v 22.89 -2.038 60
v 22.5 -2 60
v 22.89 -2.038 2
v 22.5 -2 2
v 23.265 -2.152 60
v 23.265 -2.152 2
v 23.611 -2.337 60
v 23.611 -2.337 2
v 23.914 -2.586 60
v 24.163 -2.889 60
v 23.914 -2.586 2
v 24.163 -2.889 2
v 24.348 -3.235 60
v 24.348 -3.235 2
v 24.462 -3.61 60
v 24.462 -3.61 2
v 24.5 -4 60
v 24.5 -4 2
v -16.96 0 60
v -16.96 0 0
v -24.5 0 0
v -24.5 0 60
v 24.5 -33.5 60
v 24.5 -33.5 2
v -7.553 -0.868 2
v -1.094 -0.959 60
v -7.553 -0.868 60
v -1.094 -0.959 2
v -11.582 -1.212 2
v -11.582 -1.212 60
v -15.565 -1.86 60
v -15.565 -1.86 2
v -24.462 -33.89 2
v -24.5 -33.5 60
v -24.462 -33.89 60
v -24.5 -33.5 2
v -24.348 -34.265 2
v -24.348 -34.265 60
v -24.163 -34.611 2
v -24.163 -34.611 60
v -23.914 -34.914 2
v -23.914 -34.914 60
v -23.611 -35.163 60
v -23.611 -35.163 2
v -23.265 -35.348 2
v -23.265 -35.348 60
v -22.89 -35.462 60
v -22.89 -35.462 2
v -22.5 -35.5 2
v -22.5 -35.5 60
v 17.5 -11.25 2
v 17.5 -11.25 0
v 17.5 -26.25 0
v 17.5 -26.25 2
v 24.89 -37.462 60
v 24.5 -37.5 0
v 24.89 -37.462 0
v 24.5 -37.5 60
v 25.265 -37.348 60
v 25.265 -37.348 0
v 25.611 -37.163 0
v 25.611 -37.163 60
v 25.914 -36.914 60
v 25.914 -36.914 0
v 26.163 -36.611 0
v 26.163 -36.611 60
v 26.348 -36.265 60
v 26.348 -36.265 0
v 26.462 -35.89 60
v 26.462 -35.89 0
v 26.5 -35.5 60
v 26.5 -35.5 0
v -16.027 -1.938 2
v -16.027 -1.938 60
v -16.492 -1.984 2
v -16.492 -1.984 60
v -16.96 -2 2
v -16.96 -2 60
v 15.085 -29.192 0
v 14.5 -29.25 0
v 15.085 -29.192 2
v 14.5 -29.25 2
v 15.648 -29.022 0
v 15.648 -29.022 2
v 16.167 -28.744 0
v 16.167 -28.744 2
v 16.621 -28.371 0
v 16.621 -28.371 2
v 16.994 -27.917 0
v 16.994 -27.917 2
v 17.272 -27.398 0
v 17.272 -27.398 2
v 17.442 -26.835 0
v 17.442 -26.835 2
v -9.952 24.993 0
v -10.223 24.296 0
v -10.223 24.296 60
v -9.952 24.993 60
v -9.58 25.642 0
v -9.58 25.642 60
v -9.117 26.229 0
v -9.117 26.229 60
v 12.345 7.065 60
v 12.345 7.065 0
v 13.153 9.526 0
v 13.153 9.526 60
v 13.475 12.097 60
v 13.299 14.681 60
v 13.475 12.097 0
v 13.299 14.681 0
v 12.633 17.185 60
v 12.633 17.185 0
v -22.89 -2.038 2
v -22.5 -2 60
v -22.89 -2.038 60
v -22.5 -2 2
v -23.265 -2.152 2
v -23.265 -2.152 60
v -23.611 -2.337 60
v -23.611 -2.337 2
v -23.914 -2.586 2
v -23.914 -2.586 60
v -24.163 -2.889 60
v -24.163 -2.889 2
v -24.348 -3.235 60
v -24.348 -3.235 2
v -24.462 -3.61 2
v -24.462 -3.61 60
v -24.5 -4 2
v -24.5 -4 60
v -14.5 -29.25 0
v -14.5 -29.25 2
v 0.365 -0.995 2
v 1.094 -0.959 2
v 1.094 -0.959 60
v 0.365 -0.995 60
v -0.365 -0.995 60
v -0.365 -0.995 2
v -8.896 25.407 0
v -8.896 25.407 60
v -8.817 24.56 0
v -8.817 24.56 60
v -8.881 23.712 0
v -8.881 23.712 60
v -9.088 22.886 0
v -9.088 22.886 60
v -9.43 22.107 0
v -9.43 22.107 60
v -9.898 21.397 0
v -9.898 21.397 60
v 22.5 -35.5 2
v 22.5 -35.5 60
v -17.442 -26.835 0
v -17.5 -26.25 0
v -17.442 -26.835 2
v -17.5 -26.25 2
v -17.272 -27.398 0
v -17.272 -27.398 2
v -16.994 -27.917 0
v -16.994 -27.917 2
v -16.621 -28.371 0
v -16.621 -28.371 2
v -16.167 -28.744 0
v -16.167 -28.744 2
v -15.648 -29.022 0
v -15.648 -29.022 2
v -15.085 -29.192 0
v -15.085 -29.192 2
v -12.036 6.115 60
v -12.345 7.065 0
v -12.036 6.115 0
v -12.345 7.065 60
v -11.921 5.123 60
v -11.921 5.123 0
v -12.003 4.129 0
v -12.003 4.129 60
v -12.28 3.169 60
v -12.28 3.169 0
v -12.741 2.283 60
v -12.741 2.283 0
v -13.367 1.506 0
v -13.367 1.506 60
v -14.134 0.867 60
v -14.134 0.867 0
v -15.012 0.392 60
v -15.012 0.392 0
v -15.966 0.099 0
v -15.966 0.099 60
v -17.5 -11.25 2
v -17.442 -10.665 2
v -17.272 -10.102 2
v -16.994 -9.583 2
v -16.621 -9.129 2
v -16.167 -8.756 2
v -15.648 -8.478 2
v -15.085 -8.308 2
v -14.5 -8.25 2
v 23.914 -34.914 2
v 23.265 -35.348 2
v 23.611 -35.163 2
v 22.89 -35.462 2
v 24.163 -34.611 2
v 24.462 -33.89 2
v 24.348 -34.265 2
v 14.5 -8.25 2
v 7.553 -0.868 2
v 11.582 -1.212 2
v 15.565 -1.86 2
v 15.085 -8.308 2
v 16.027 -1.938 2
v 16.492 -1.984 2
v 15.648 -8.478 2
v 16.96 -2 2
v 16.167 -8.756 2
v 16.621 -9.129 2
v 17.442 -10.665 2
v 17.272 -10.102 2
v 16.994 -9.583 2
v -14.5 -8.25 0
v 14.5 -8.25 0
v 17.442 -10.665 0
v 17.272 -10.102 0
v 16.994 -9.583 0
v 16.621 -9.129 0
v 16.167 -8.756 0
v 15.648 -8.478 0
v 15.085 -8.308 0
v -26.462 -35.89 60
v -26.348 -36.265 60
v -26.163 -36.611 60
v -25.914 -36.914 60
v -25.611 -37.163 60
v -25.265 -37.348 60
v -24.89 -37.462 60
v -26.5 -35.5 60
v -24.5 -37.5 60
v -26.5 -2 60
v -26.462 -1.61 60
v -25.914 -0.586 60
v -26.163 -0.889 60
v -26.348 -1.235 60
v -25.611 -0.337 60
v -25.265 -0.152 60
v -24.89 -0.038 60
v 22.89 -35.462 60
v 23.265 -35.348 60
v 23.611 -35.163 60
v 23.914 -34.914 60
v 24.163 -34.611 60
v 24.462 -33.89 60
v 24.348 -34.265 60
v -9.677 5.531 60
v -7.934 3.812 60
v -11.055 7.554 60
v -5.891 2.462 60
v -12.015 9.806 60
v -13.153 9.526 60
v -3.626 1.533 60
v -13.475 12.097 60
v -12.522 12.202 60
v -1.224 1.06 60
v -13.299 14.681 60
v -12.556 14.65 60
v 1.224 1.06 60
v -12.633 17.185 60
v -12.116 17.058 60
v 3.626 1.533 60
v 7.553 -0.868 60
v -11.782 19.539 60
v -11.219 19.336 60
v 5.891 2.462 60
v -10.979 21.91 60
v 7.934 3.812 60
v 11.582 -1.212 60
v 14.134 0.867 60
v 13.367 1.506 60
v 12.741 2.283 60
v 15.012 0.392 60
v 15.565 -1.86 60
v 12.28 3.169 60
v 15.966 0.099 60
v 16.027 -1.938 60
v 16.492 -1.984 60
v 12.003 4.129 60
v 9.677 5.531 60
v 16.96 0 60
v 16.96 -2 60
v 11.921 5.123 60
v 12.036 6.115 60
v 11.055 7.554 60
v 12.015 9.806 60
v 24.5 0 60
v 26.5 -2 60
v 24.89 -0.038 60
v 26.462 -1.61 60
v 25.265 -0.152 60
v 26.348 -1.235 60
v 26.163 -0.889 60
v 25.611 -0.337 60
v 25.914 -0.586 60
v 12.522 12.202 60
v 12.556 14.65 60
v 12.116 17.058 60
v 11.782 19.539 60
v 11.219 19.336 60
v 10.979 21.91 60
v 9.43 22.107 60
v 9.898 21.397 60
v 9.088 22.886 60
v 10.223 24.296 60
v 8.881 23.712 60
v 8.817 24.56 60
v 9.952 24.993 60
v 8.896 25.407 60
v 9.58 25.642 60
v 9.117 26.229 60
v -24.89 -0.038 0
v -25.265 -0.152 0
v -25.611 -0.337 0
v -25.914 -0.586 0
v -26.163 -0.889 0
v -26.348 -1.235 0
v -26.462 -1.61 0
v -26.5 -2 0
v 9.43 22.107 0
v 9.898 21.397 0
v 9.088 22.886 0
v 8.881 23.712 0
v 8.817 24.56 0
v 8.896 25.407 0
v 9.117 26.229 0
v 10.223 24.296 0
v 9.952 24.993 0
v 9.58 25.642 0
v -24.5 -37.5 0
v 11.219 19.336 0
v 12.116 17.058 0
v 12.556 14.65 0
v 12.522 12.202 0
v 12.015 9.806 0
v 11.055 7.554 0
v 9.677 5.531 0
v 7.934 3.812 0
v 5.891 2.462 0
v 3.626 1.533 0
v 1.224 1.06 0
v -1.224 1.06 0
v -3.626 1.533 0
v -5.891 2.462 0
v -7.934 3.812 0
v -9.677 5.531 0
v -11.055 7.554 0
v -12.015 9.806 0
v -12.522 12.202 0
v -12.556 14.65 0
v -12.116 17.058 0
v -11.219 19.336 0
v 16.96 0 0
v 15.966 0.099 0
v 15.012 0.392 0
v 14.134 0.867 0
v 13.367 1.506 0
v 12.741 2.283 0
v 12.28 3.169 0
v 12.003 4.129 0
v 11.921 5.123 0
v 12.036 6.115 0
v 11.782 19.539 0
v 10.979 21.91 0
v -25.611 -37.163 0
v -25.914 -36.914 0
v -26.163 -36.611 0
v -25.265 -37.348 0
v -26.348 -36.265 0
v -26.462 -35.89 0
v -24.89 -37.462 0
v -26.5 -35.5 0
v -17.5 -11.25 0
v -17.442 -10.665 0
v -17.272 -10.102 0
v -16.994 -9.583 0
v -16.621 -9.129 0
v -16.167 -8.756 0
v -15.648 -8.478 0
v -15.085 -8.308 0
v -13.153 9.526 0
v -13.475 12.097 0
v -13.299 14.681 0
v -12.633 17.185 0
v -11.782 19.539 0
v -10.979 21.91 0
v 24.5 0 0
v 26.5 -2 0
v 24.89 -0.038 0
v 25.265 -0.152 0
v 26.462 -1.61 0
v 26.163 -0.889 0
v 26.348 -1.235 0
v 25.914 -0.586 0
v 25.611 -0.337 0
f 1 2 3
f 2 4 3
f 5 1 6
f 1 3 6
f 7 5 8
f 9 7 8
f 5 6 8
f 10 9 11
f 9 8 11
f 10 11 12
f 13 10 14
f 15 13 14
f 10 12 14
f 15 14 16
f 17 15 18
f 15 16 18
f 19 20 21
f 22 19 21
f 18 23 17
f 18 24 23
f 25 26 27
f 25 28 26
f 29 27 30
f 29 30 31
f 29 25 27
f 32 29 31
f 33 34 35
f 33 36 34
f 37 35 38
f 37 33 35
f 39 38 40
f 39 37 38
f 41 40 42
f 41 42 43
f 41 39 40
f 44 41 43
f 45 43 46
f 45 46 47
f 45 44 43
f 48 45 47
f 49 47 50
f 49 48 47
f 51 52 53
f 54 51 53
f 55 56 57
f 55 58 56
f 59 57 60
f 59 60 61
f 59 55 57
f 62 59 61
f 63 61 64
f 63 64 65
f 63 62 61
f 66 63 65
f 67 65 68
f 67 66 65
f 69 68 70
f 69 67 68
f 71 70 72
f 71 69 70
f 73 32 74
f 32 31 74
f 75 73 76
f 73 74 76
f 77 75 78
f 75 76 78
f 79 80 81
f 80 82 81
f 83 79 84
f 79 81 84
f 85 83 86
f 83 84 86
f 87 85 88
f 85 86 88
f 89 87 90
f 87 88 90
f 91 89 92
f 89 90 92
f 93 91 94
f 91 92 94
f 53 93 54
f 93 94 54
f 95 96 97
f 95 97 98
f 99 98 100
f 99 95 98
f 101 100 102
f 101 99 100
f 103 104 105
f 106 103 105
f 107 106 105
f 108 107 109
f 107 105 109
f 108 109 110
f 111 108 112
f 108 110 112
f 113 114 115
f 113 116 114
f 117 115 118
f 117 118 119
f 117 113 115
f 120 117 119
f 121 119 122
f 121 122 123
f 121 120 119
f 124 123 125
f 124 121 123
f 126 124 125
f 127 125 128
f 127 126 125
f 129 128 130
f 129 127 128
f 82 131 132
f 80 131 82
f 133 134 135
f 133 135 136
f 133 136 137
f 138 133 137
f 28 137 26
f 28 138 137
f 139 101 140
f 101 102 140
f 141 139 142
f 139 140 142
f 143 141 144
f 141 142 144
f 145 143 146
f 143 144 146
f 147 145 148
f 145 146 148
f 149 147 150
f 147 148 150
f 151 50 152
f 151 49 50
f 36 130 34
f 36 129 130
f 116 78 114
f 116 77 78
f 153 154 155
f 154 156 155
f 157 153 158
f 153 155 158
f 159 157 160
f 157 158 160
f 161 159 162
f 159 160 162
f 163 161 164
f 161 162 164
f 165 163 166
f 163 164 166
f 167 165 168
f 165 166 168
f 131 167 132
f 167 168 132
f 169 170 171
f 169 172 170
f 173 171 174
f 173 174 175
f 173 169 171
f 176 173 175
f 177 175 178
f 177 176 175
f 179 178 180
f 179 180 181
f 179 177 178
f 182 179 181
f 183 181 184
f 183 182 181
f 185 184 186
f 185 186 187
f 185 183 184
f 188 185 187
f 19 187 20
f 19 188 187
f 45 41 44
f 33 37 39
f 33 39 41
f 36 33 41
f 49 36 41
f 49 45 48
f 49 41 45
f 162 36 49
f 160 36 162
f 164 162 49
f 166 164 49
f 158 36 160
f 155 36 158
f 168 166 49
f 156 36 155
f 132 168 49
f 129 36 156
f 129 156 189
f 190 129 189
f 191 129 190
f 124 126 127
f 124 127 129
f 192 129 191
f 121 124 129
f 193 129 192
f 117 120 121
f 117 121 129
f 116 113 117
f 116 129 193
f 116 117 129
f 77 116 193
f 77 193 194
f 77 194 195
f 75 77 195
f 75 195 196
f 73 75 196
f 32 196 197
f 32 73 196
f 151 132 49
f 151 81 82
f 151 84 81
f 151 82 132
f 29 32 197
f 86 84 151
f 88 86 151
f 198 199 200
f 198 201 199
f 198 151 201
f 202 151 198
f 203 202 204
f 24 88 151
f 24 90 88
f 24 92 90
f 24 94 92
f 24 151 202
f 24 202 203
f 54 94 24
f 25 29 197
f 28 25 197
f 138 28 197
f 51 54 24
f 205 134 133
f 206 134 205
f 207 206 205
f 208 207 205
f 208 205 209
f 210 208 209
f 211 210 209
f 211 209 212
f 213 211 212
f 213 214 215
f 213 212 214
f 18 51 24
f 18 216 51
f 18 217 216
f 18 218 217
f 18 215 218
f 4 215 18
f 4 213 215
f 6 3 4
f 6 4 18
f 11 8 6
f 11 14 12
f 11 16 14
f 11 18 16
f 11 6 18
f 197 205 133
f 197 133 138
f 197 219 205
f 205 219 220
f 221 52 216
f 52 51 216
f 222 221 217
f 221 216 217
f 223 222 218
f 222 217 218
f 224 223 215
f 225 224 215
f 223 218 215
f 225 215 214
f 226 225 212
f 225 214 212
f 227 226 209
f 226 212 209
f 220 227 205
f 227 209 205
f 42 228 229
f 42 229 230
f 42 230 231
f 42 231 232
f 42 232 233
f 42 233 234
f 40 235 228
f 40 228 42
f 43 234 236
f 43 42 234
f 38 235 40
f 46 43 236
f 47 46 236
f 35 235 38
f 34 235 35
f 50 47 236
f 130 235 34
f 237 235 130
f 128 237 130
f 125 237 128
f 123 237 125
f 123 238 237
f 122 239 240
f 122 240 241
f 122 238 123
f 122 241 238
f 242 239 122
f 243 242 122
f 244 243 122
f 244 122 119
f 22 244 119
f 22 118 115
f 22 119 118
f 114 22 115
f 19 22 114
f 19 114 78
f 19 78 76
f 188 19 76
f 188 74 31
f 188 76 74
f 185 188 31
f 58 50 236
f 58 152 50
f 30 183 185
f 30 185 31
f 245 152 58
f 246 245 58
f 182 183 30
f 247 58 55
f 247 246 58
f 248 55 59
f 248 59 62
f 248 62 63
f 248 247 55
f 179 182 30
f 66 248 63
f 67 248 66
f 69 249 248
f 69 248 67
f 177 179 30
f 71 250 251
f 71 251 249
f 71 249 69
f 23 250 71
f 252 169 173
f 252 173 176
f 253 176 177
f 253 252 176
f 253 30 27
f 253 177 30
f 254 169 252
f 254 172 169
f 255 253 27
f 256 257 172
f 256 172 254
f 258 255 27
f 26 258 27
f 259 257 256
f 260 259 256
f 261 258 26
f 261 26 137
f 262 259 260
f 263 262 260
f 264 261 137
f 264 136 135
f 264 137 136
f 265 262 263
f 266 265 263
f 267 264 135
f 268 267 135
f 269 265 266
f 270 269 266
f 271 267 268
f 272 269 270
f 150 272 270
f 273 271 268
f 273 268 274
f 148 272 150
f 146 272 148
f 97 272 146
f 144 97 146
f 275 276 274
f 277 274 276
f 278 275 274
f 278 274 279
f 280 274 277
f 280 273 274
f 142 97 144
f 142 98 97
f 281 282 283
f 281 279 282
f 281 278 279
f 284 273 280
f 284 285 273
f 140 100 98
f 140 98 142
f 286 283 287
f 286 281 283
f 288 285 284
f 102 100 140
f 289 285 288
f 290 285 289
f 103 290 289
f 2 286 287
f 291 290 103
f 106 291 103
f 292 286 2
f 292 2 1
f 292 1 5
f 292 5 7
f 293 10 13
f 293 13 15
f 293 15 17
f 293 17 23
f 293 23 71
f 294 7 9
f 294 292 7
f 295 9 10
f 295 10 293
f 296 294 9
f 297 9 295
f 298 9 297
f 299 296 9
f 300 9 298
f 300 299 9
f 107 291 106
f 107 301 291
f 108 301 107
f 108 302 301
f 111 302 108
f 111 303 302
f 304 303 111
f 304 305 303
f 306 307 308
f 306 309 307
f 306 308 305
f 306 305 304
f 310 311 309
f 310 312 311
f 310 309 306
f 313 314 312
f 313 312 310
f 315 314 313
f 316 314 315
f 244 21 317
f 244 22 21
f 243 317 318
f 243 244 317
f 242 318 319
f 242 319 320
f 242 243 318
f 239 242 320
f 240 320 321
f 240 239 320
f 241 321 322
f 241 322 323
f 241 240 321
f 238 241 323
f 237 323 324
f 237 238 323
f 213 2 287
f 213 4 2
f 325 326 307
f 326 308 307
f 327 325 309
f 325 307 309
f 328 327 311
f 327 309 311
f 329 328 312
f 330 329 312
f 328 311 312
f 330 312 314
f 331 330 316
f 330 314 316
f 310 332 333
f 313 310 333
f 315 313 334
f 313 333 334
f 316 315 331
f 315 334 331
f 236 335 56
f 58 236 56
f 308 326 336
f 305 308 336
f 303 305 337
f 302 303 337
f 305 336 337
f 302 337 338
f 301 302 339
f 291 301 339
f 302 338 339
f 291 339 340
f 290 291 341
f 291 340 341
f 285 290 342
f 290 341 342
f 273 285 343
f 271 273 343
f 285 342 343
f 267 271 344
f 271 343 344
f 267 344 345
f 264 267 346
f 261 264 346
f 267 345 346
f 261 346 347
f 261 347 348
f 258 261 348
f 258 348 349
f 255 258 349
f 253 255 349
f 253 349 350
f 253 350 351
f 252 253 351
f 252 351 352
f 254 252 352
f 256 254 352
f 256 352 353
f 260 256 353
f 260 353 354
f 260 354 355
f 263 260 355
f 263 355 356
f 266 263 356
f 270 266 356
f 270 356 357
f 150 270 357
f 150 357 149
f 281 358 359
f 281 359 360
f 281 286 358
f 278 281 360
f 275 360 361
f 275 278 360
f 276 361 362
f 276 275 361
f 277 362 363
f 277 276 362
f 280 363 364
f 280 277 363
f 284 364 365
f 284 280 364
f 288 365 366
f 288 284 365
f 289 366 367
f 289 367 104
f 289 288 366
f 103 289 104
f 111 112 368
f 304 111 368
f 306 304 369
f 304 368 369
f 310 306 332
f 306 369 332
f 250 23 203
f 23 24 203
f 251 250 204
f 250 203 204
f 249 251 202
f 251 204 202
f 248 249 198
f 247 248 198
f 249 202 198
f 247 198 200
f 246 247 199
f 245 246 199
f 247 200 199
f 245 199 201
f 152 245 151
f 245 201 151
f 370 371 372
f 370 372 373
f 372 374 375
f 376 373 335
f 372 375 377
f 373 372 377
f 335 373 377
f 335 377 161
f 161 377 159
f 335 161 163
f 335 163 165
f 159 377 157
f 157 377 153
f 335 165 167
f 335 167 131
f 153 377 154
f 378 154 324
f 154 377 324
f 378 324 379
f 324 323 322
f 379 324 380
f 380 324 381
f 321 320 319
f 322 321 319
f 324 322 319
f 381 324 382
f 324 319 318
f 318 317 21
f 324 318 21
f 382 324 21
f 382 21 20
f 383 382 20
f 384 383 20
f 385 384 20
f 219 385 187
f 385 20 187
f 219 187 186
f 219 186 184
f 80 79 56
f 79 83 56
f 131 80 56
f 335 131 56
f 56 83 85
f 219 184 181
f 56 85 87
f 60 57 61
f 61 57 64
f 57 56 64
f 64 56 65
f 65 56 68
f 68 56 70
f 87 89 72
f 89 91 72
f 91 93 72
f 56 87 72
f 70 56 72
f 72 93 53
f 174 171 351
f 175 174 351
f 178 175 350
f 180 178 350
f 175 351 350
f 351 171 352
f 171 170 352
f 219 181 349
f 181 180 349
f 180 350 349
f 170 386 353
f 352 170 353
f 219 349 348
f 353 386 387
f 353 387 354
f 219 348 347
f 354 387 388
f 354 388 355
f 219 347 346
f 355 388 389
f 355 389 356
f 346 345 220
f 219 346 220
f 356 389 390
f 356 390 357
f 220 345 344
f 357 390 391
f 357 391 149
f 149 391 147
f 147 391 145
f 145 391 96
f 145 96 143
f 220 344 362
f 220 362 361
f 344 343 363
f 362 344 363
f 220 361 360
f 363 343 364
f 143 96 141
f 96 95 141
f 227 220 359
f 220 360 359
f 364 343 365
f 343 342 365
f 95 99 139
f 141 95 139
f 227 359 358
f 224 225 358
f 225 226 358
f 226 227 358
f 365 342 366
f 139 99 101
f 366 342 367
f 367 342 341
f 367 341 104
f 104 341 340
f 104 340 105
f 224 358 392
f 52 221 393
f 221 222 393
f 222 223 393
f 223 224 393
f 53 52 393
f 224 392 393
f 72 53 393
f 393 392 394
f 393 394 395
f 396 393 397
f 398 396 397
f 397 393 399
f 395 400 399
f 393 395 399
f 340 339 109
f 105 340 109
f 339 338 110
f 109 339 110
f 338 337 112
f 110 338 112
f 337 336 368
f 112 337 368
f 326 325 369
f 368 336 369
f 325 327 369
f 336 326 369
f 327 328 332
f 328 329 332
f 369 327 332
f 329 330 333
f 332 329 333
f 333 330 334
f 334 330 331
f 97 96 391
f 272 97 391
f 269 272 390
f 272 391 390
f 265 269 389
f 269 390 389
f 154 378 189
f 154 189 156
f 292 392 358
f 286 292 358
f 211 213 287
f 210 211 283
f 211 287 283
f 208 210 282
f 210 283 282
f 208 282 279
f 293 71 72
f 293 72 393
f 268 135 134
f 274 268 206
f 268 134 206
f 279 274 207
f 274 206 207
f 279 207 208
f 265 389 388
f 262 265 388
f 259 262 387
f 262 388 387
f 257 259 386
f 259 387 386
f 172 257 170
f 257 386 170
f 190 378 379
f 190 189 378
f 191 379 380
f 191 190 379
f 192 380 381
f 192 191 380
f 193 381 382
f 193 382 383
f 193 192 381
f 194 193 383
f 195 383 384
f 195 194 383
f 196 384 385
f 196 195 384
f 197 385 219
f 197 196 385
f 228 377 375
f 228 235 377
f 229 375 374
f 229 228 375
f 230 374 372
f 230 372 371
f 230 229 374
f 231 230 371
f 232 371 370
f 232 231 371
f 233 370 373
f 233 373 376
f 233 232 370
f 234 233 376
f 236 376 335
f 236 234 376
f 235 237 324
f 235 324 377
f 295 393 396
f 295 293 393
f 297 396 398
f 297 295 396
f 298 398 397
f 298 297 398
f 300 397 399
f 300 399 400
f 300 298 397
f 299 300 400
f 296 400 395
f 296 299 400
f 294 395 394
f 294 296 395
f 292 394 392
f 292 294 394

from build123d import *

# Parameters (mm, degrees)
F4_W        = 53
F4_H        = 35.5
F5_DEPTH    = 60
F6_T1_DEPTH = 60
F7_R        = 5.04
F9_T1_DEPTH = 74.3591672048
F10_T       = -2
F12_R       = 53
F13_R       = 2
F11_W       = 35
F11_H       = 21
F14_DEPTH   = 2
F15_R       = 3


# Not quite as in the source:
# - a fillet or chamfer that OpenCascade refuses, or shapes differently, is made with other operations: its cross-section is extruded or revolved along the edge and cut away or added
# - two fillets or chamfers of one size are made in one step


with BuildPart() as f5:
    # F4 (on Top) → F5 (new body)
    with BuildSketch(Plane.XY):
        with BuildLine():
            Line((-26.5, 0), (-26.5, -2))
            Line((-26.5, -2), (26.5, -2))
            Line((26.5, -2), (26.5, 0))
            Line((26.5, 0), (5.0951280026, 0))
            ThreePointArc((5.0951280026, 0), (0, -1), (-5.0951280026, 0))
            Line((-5.0951280026, 0), (-26.5, 0))
        make_face()
        with Locations((0, -19.75)):
            Rectangle(F4_W, F4_H)
        with BuildLine():
            ThreePointArc((-9.414110408, 22.1284476932), (-13.2305158305, 9.8978613101), (-5.0951280026, 0))
            Line((-5.0951280026, 0), (5.0951280026, 0))
            ThreePointArc((5.0951280026, 0), (13.2305158305, 9.8978613101), (9.414110408, 22.1284476932))
            ThreePointArc((9.414110408, 22.1284476932), (8.753655045, 22.7314262234), (8.0546720819, 23.2892857143))
            ThreePointArc((8.0546720819, 23.2892857143), (0, 1), (-8.0546720819, 23.2892857143))
            ThreePointArc((-8.0546720819, 23.2892857143), (-8.753655045, 22.7314262234), (-9.414110408, 22.1284476932))
        make_face()
        with BuildLine():
            Line((5.0951280026, 0), (-5.0951280026, 0))
            ThreePointArc((-5.0951280026, 0), (0, -1), (5.0951280026, 0))
        make_face()
        with BuildLine():
            Line((-9.414110408, 27.0511904762), (-9.414110408, 22.1284476932))
            ThreePointArc((-9.414110408, 22.1284476932), (-8.753655045, 22.7314262234), (-8.0546720819, 23.2892857143))
            Line((-8.0546720819, 23.2892857143), (-9.414110408, 27.0511904762))
        make_face()
        with BuildLine():
            ThreePointArc((8.0546720819, 23.2892857143), (8.753655045, 22.7314262234), (9.414110408, 22.1284476932))
            Line((9.414110408, 22.1284476932), (9.414110408, 27.0511904762))
            Line((9.414110408, 27.0511904762), (8.0546720819, 23.2892857143))
        make_face()
    extrude(amount=F5_DEPTH)

    # F6: fillet of radius 126 on 2 edges, made by hand

    # F6_s2 → F6_t1 (join)
    with BuildSketch(Plane.XY):
        with BuildLine():
            ThreePointArc((-9.414110408, 27.0511904762), (-10.9216954082, 22.0848726308), (-12.632526933, 17.1848541647))
            ThreePointArc((-12.632526933, 17.1848541647), (-11.297049781, 19.8348574754), (-9.414110408, 22.1284476932))
            Line((-9.414110408, 22.1284476932), (-9.414110408, 27.0511904762))
        make_face()
        with BuildLine():
            ThreePointArc((12.632526933, 17.1848541647), (10.9216954082, 22.0848726308), (9.414110408, 27.0511904762))
            Line((9.414110408, 27.0511904762), (9.414110408, 22.1284476932))
            ThreePointArc((9.414110408, 22.1284476932), (11.297049781, 19.8348574754), (12.632526933, 17.1848541647))
        make_face()
    extrude(amount=F6_T1_DEPTH)

    # F7
    f7_edges = [f5.edges().sort_by_distance(p)[0] for p in [
        (-5.095128, 0, 30),
        (5.095128, 0, 30),
        (8.054672, 23.289286, 30),
        (-8.054672, 23.289286, 30),
    ]]
    fillet(f7_edges, radius=F7_R)

    # F9: fillet of radius 5.04 on 2 edges, made by hand

    # F9_s2 → F9_t1 (cut)
    with BuildSketch(Plane.XY.offset(-7.1795836024)):
        with BuildLine():
            ThreePointArc((10.2229827876, 24.2956228784), (9.778060574, 25.324045565), (9.116903363, 26.2287444879))
            Line((9.116903363, 26.2287444879), (9.414110408, 27.0511904762))
            ThreePointArc((9.414110408, 27.0511904762), (9.8106956175, 25.6711020918), (10.2229827876, 24.2956228784))
        make_face()
        with BuildLine():
            ThreePointArc((-10.2229827876, 24.2956228784), (-9.778060574, 25.324045565), (-9.116903363, 26.2287444879))
            Line((-9.116903363, 26.2287444879), (-9.414110408, 27.0511904762))
            ThreePointArc((-9.414110408, 27.0511904762), (-9.8106956175, 25.6711020918), (-10.2229827876, 24.2956228784))
        make_face()
    extrude(amount=F9_T1_DEPTH, mode=Mode.SUBTRACT)

    # F10
    f10_openings = [f5.faces().sort_by_distance(p)[0] for p in [
        (0, -17.249718, 60),
    ]]
    offset(amount=F10_T, openings=f10_openings)

    # F12
    f12_edges = [f5.edges().sort_by_distance(p)[0] for p in [
        (-10.182168, 3.136566, 31),
        (10.182168, 3.136566, 31),
    ]]
    fillet(f12_edges, radius=F12_R)

    # F13
    f13_edges = [f5.edges().sort_by_distance(p)[0] for p in [
        (-26.5, 0, 30),
        (26.5, 0, 30),
        (24.5, -35.5, 31),
        (-24.5, -35.5, 31),
        (26.5, -37.5, 30),
        (-26.5, -37.5, 30),
        (24.5, -2, 31),
        (-24.5, -2, 31),
    ]]
    fillet(f13_edges, radius=F13_R)

    # F11 (on face) → F14 (cut)
    with BuildSketch(Plane(origin=(0, 0, 0), x_dir=(1, 0, 0), z_dir=(0, 0, -1))):
        with Locations((0, 18.75)):
            Rectangle(F11_W, F11_H)
    extrude(amount=-F14_DEPTH, mode=Mode.SUBTRACT)

    # F15
    f15_edges = [f5.edges().sort_by_distance(p)[0] for p in [
        (17.5, -8.25, 1),
        (-17.5, -8.25, 1),
        (-17.5, -29.25, 1),
        (17.5, -29.25, 1),
    ]]
    fillet(f15_edges, radius=F15_R)


solid = f5.part
